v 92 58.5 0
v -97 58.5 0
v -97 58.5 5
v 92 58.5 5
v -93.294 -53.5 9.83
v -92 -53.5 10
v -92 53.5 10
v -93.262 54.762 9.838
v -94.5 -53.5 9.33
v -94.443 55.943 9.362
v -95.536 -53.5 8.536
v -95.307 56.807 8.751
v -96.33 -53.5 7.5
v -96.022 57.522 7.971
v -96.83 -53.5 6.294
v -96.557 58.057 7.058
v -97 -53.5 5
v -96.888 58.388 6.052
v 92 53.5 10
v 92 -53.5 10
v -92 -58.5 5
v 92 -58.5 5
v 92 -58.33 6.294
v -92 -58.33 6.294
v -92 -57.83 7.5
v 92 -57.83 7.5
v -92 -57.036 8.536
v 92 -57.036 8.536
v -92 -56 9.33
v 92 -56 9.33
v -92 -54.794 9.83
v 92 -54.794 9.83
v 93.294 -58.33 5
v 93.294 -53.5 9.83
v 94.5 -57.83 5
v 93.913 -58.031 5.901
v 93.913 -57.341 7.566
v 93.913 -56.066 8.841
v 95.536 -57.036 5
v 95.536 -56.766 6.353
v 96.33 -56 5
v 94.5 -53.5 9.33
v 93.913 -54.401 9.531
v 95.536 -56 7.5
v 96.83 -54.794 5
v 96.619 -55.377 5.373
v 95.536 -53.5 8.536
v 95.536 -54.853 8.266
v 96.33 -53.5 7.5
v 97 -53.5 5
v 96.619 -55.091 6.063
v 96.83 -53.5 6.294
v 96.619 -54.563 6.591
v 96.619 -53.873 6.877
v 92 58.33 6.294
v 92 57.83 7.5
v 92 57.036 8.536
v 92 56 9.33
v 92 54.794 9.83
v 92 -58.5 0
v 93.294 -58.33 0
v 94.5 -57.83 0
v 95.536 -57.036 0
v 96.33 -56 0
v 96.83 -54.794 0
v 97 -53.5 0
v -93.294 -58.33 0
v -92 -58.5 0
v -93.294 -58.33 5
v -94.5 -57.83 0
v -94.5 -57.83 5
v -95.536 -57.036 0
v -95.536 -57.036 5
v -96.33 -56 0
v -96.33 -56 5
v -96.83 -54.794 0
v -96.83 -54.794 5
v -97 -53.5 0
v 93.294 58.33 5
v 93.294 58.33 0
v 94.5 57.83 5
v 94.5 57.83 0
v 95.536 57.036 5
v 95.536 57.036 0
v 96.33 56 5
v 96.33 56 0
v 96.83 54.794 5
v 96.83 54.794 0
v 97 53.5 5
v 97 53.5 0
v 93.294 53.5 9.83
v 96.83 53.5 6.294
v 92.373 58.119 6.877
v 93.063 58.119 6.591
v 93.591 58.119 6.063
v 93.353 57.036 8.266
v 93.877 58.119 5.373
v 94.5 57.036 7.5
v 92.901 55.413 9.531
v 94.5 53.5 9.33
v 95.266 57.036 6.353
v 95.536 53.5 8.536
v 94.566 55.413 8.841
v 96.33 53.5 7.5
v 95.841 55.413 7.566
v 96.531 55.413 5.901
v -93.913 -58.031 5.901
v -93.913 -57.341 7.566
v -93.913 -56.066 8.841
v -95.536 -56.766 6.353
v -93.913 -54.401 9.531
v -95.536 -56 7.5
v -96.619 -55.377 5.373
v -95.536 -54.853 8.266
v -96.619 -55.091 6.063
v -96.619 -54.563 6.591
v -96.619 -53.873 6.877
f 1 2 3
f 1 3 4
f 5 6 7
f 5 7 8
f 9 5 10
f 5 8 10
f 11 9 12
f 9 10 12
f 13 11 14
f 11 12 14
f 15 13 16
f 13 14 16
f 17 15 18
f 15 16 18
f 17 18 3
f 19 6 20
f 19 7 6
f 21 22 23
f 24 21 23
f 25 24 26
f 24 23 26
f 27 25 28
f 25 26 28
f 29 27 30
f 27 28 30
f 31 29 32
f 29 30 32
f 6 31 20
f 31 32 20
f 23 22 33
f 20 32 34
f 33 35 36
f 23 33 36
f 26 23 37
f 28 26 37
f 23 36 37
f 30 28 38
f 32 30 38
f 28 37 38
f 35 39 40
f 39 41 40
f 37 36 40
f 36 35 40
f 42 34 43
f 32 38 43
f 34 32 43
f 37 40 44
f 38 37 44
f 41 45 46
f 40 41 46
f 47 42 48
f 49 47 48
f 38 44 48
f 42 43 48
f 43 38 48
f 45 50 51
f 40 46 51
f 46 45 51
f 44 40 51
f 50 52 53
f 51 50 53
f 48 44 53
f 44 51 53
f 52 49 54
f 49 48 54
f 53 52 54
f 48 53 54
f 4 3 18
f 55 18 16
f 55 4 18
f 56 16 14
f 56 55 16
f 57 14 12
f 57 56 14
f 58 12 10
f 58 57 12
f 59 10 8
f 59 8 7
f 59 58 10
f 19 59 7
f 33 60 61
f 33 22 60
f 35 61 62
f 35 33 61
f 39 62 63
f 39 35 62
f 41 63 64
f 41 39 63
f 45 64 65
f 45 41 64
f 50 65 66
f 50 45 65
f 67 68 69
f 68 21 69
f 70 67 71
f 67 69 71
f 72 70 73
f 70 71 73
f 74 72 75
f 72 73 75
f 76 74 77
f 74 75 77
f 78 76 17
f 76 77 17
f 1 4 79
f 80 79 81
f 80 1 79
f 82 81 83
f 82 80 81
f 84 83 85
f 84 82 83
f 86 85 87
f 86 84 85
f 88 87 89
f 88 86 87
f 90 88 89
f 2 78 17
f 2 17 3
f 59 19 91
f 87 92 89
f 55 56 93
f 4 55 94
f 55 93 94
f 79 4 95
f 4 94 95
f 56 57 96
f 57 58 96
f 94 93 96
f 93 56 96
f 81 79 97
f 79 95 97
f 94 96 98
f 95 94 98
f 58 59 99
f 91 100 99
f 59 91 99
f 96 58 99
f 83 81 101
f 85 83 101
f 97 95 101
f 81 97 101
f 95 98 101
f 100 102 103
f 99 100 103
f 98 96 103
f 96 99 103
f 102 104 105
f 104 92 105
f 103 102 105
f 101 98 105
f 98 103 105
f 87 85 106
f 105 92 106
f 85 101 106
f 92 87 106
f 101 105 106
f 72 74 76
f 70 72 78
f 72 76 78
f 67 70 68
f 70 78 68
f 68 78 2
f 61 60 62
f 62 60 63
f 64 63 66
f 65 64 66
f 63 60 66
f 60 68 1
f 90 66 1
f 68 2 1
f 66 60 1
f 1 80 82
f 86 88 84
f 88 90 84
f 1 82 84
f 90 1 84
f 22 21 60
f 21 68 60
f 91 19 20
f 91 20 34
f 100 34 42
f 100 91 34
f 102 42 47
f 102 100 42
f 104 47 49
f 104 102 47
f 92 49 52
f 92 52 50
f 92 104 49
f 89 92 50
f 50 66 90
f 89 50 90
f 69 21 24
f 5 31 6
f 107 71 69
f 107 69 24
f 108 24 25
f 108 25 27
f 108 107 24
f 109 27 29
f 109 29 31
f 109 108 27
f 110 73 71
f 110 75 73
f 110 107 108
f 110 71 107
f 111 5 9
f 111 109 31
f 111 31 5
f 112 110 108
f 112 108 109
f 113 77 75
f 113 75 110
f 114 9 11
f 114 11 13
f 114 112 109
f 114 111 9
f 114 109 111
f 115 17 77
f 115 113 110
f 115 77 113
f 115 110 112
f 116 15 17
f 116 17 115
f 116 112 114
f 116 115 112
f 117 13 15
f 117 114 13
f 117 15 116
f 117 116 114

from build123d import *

# Parameters (mm, degrees)
F0_W     = 194
F0_H     = 117
F1_DEPTH = 10
F2_R     = 5
F3_R     = 5
F4_R     = 5


with BuildPart() as f1:
    # F0 (on Top) → F1 (new body)
    with BuildSketch(Plane.XY):
        Rectangle(F0_W, F0_H)
    extrude(amount=F1_DEPTH)

    # F2
    f2_edges = [f1.edges().sort_by_distance(p)[0] for p in [
        (0, -58.5, 10),
    ]]
    fillet(f2_edges, radius=F2_R)

    # F3
    f3_edges = [f1.edges().sort_by_distance(p)[0] for p in [
        (0, -58.5, 5),
        (97, -57.035534, 8.535534),
    ]]
    fillet(f3_edges, radius=F3_R)

    # F4
    f4_edges = [f1.edges().sort_by_distance(p)[0] for p in [
        (97, 2.5, 5),
        (95.535534, 58.5, 8.535534),
        (-97, -57.035534, 8.535534),
    ]]
    fillet(f4_edges, radius=F4_R)


solid = f1.part
